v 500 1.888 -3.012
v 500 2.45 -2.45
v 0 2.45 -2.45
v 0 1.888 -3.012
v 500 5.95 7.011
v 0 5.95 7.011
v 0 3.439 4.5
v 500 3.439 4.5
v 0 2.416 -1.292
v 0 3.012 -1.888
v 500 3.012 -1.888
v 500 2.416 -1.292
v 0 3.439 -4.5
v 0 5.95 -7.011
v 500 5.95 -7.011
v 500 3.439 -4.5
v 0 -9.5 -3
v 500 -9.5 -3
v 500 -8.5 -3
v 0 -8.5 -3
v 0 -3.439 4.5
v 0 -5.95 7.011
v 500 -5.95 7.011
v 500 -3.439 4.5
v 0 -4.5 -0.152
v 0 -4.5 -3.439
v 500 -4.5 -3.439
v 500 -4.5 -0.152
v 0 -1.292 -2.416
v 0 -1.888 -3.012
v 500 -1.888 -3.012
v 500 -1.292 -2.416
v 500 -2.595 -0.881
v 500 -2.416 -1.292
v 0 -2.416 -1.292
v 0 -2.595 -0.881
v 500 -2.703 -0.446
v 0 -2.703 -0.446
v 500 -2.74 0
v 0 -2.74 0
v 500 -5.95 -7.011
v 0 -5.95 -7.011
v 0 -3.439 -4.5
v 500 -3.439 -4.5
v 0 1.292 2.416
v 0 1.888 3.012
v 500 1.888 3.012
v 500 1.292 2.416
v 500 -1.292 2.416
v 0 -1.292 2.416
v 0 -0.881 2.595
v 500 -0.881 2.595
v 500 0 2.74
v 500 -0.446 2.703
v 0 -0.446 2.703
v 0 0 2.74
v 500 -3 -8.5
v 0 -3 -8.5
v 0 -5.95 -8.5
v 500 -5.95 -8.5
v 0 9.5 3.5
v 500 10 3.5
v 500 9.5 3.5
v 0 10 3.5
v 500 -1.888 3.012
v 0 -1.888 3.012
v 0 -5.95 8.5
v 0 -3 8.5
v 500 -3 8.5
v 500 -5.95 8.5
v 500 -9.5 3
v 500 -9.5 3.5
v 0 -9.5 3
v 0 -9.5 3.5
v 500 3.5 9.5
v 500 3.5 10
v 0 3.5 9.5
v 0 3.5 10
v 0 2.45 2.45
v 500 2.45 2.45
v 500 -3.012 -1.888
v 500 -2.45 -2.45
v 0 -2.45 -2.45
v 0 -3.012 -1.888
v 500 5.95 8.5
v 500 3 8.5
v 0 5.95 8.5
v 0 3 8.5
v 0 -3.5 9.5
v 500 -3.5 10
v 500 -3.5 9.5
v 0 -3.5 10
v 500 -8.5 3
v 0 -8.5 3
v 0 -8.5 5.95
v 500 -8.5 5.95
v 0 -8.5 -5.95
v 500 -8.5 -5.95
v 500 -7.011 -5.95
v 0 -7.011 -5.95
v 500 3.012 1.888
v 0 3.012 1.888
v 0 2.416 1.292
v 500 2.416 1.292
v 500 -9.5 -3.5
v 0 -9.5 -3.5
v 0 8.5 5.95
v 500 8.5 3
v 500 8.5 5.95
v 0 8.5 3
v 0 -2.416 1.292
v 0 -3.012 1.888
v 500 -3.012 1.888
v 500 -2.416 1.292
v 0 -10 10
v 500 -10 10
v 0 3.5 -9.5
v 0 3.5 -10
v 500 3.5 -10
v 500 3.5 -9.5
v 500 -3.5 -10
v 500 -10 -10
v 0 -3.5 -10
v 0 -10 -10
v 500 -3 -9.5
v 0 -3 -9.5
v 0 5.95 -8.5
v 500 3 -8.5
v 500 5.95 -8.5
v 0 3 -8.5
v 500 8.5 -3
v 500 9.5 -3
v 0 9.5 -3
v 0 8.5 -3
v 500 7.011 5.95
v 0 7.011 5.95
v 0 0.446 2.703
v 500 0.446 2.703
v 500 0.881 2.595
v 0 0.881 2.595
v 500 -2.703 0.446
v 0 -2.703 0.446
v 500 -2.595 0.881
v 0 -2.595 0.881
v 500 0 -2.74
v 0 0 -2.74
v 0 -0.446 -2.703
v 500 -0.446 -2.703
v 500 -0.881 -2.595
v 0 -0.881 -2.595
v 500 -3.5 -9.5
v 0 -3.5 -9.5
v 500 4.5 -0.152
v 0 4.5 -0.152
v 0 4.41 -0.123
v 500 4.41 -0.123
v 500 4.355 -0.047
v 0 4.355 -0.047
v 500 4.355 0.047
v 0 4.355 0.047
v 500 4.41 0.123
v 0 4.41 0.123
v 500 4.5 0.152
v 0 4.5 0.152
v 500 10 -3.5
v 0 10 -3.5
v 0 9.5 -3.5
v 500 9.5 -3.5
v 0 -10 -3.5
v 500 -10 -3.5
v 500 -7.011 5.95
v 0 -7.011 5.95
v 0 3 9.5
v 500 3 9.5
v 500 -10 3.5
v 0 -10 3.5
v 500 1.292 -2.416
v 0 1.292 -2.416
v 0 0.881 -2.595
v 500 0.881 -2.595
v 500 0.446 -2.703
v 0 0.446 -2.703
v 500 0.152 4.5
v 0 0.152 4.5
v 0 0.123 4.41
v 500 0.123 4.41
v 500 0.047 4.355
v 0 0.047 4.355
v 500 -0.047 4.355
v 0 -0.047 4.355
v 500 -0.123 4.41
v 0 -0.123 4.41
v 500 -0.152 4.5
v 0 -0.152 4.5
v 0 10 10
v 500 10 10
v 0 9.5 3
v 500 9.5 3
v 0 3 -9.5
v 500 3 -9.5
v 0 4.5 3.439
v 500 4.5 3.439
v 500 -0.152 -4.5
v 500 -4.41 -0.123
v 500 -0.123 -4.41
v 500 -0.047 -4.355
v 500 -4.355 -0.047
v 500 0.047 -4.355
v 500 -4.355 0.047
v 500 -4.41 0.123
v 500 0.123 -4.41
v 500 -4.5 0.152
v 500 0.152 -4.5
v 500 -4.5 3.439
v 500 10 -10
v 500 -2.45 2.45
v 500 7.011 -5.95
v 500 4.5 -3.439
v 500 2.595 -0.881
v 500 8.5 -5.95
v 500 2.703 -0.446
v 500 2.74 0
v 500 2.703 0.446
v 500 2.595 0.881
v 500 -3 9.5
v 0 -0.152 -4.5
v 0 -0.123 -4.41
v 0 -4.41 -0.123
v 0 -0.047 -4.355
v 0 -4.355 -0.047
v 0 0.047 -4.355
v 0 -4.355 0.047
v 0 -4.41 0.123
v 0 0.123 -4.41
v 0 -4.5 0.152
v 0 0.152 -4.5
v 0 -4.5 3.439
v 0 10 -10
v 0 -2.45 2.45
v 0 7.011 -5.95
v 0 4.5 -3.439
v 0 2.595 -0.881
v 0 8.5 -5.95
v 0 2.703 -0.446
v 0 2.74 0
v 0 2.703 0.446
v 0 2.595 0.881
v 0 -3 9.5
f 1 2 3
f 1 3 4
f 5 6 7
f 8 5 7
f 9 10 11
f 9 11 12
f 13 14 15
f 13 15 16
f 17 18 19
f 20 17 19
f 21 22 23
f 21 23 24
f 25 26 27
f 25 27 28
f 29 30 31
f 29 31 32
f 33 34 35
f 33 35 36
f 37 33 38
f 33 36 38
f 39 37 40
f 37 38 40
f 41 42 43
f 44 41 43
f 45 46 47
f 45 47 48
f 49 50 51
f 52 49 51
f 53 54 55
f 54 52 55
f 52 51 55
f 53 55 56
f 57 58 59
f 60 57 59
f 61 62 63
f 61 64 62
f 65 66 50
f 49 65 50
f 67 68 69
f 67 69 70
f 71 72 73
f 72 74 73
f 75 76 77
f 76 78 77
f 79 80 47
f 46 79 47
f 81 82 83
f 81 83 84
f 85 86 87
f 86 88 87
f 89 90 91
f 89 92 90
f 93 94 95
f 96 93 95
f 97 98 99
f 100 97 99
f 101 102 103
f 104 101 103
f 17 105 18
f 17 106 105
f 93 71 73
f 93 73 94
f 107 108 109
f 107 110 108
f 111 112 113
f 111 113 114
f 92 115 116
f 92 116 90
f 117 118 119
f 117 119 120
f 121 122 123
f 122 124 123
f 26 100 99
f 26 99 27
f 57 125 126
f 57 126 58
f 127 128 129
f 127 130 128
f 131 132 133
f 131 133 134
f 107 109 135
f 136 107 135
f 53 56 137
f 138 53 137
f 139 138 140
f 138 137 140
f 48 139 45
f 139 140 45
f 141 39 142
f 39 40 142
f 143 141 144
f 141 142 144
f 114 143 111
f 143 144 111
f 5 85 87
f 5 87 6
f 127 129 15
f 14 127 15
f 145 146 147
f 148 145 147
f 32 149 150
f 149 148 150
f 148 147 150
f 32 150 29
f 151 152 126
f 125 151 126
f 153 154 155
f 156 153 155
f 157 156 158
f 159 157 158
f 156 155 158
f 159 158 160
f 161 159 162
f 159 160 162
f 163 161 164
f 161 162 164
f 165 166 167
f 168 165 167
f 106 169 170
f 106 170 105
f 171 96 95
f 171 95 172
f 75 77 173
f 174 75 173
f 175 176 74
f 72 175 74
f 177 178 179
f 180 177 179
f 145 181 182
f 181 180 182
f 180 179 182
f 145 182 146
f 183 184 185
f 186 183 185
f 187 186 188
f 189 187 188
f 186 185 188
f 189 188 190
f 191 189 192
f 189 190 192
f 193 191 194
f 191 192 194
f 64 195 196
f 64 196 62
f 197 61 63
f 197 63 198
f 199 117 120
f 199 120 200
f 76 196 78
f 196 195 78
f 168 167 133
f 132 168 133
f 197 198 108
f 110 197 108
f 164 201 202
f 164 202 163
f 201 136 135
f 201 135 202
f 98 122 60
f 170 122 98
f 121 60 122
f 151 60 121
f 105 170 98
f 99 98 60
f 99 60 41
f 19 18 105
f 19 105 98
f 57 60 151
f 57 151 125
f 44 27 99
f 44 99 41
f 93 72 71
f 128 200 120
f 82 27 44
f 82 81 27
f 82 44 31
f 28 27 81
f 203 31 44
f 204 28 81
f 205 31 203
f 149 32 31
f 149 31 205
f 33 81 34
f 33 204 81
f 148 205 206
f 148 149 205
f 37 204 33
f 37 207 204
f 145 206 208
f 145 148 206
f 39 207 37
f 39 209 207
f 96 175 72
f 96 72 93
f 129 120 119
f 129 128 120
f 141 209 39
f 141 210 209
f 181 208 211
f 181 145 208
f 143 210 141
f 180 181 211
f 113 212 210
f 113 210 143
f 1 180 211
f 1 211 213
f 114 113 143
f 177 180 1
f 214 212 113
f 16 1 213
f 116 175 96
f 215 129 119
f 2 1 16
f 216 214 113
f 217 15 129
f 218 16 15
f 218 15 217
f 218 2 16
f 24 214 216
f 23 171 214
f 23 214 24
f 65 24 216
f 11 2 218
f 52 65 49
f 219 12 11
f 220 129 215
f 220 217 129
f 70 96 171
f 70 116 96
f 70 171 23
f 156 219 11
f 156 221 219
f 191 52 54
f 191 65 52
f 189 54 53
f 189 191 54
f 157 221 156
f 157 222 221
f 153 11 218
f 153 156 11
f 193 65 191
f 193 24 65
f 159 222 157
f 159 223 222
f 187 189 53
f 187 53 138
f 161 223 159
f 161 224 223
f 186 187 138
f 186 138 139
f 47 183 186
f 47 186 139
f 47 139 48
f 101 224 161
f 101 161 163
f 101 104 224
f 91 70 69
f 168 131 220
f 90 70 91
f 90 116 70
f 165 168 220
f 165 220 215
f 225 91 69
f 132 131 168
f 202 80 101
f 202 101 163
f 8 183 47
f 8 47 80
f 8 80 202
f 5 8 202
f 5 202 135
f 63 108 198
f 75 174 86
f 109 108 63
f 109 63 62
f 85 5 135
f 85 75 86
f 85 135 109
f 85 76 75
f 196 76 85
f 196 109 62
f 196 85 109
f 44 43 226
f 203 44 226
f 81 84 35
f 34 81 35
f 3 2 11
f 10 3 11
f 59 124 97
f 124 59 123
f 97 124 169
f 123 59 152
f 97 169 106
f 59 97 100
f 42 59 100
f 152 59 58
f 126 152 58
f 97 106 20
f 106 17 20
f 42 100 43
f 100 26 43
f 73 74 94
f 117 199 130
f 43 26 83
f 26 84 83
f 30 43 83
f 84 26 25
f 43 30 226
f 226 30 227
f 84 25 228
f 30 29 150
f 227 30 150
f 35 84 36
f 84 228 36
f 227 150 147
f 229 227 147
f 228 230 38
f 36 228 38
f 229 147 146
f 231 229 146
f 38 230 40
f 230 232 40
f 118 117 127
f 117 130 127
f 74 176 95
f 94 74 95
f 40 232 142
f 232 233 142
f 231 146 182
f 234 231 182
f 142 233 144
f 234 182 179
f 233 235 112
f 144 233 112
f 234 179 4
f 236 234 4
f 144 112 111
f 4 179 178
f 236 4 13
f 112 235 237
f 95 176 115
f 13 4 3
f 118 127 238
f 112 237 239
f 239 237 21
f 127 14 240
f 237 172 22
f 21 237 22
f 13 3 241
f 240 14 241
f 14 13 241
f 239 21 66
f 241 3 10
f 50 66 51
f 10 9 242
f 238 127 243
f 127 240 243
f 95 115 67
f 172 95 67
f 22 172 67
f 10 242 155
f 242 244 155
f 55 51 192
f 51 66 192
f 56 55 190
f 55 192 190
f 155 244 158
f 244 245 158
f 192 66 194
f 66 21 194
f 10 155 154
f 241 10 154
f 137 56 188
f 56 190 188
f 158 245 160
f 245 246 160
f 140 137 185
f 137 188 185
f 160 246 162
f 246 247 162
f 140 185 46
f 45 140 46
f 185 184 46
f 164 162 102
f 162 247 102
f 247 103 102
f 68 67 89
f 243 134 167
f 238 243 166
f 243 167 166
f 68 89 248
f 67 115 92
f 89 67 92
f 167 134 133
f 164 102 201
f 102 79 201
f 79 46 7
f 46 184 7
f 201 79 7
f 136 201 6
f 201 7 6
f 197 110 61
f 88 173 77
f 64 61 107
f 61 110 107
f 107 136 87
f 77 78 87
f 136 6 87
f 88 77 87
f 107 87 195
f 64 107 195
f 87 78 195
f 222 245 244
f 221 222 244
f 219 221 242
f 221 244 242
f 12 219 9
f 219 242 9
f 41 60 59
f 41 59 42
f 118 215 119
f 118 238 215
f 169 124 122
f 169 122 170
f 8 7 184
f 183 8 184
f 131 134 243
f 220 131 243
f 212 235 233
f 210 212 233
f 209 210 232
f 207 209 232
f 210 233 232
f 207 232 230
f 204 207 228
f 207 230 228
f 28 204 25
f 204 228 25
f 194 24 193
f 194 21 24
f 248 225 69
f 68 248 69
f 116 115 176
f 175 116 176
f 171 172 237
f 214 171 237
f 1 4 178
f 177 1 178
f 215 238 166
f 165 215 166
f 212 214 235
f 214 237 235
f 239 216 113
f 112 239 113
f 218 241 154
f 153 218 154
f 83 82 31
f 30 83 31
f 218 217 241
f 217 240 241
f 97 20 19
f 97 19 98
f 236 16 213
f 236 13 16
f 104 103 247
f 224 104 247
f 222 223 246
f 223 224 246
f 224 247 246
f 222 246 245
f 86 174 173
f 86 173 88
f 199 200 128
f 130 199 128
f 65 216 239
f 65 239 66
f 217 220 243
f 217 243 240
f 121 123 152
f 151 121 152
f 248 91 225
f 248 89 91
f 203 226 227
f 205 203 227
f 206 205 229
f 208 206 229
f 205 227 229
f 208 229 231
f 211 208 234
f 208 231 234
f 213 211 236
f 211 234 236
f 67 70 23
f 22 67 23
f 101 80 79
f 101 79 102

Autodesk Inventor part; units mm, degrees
ref_plane "YZ Plane" through (0, 0, 0) normal (1, 0, 0) x (0, 1, 0)
ref_plane "XZ Plane" through (0, 0, 0) normal (0, 1, 0) x (-1, 0, 0)
ref_plane "XY Plane" through (0, 0, 0) normal (0, 0, 1) x (1, 0, 0)
sketch "Sketch1" plane through (0, 0, 0) normal (1, 0, 0) x (0, 1, 0)
  line L0 (-10, -10) -> (10, 10) construction
  line L1 (10, 10) -> (10, 3.5)
  line L2 (10, 3.5) -> (9.5, 3.5)
  line L3 (9.5, 3.5) -> (9.5, 3)
  line L4 (9.5, 3) -> (8.5, 3)
  line L5 (8.5, 3) -> (8.5, 5.95)
  line L6 (8.5, 5.95) -> (7.0107, 5.95)
  line L7 (7.0107, 5.95) -> (4.5, 3.4393)
  line L8 (4.5, 3.4393) -> (4.5, 0.1525)
  line L9 (2.4501, 2.4501) -> (3.0123, 1.888)
  line L10 (3.0123, 1.888) -> (2.4163, 1.292)
  arc A0 (2.74, 0) -> (2.4163, 1.292) centre (0, 0) ccw
  arc A1 (4.5, 0.1525) -> (4.3475, 0) centre (4.5, 0) ccw
  line L11 (10, 10) -> (2.4501, 2.4501)
  line L12 (4.3475, 0) -> (2.74, 0)
  line L13 (0, 0) -> (2.74, 0) construction
  line L14 (10, 10) -> (3.5, 10)
  line L15 (3.5, 10) -> (3.5, 9.5)
  line L16 (3.5, 9.5) -> (3, 9.5)
  line L17 (3, 9.5) -> (3, 8.5)
  line L18 (3, 8.5) -> (5.95, 8.5)
  line L19 (5.95, 8.5) -> (5.95, 7.0107)
  line L20 (5.95, 7.0107) -> (3.4393, 4.5)
  line L21 (3.4393, 4.5) -> (0.1525, 4.5)
  line L22 (2.4501, 2.4501) -> (1.888, 3.0123)
  line L23 (1.888, 3.0123) -> (1.292, 2.4163)
  arc A2 (1.292, 2.4163) -> (0, 2.74) centre (0, 0) ccw
  arc A3 (0, 4.3475) -> (0.1525, 4.5) centre (0, 4.5) ccw
  line L24 (0, 4.3475) -> (0, 2.74)
  line L25 (0, 0) -> (0, 2.74) construction
  line L26 (-8.5, 5.95) -> (-7.0107, 5.95)
  line L27 (-10, 3.5) -> (-9.5, 3.5)
  line L28 (-8.5, 3) -> (-8.5, 5.95)
  line L29 (-9.5, 3.5) -> (-9.5, 3)
  line L30 (-9.5, 3) -> (-8.5, 3)
  line L31 (-5.95, 8.5) -> (-5.95, 7.0107)
  line L32 (-7.0107, 5.95) -> (-4.5, 3.4393)
  line L33 (-5.95, 7.0107) -> (-3.4393, 4.5)
  line L34 (-10, 10) -> (-10, 3.5)
  line L35 (-10, 10) -> (-3.5, 10)
  line L36 (-10, 10) -> (-2.4501, 2.4501)
  line L37 (-3, 8.5) -> (-5.95, 8.5)
  line L38 (-3, 9.5) -> (-3, 8.5)
  line L39 (-3.5, 10) -> (-3.5, 9.5)
  line L40 (-3.5, 9.5) -> (-3, 9.5)
  line L41 (-3.4393, 4.5) -> (-0.1525, 4.5)
  line L42 (-2.4501, 2.4501) -> (-1.888, 3.0123)
  line L43 (-1.888, 3.0123) -> (-1.292, 2.4163)
  arc A4 (0, 2.74) -> (-1.292, 2.4163) centre (0, 0) ccw
  arc A5 (-0.1525, 4.5) -> (0, 4.3475) centre (0, 4.5) ccw
  line L44 (-2.4501, 2.4501) -> (-3.0123, 1.888)
  line L45 (-4.5, 3.4393) -> (-4.5, 0.1525)
  arc A6 (-4.3475, 0) -> (-4.5, 0.1525) centre (-4.5, 0) ccw
  line L46 (0, 4.3475) -> (0, 2.74)
  line L47 (-4.3475, 0) -> (-2.74, 0)
  arc A7 (-2.4163, 1.292) -> (-2.74, 0) centre (0, 0) ccw
  line L48 (0, 0) -> (0, 2.74) construction
  line L49 (-3.0123, 1.888) -> (-2.4163, 1.292)
  line L50 (-5.95, -8.5) -> (-5.95, -7.0107)
  line L51 (-3.5, -10) -> (-3.5, -9.5)
  line L52 (-3, -8.5) -> (-5.95, -8.5)
  line L53 (-3.5, -9.5) -> (-3, -9.5)
  line L54 (-3, -9.5) -> (-3, -8.5)
  line L55 (-8.5, -5.95) -> (-7.0107, -5.95)
  line L56 (-5.95, -7.0107) -> (-3.4393, -4.5)
  line L57 (-7.0107, -5.95) -> (-4.5, -3.4393)
  line L58 (-10, -10) -> (-3.5, -10)
  line L59 (-10, -10) -> (-10, -3.5)
  line L60 (-10, -10) -> (-2.4501, -2.4501)
  line L61 (-8.5, -3) -> (-8.5, -5.95)
  line L62 (-9.5, -3) -> (-8.5, -3)
  line L63 (-10, -3.5) -> (-9.5, -3.5)
  line L64 (-9.5, -3.5) -> (-9.5, -3)
  line L65 (-4.5, -3.4393) -> (-4.5, -0.1525)
  line L66 (-2.4501, -2.4501) -> (-3.0123, -1.888)
  line L67 (-3.0123, -1.888) -> (-2.4163, -1.292)
  arc A8 (-2.74, 0) -> (-2.4163, -1.292) centre (0, 0) ccw
  arc A9 (-4.5, -0.1525) -> (-4.3475, 0) centre (-4.5, 0) ccw
  line L68 (-2.4501, -2.4501) -> (-1.888, -3.0123)
  line L69 (-3.4393, -4.5) -> (-0.1525, -4.5)
  arc A10 (0, -4.3475) -> (-0.1525, -4.5) centre (0, -4.5) ccw
  line L70 (-4.3475, 0) -> (-2.74, 0)
  line L71 (0, -4.3475) -> (0, -2.74)
  arc A11 (-1.292, -2.4163) -> (0, -2.74) centre (0, 0) ccw
  line L72 (0, 0) -> (-2.74, 0) construction
  line L73 (-1.888, -3.0123) -> (-1.292, -2.4163)
  line L74 (8.5, -5.95) -> (7.0107, -5.95)
  line L75 (10, -3.5) -> (9.5, -3.5)
  line L76 (8.5, -3) -> (8.5, -5.95)
  line L77 (9.5, -3.5) -> (9.5, -3)
  line L78 (9.5, -3) -> (8.5, -3)
  line L79 (5.95, -8.5) -> (5.95, -7.0107)
  line L80 (7.0107, -5.95) -> (4.5, -3.4393)
  line L81 (5.95, -7.0107) -> (3.4393, -4.5)
  line L82 (10, -10) -> (10, -3.5)
  line L83 (10, -10) -> (3.5, -10)
  line L84 (10, -10) -> (2.4501, -2.4501)
  line L85 (3, -8.5) -> (5.95, -8.5)
  line L86 (3, -9.5) -> (3, -8.5)
  line L87 (3.5, -10) -> (3.5, -9.5)
  line L88 (3.5, -9.5) -> (3, -9.5)
  line L89 (3.4393, -4.5) -> (0.1525, -4.5)
  line L90 (2.4501, -2.4501) -> (1.888, -3.0123)
  line L91 (1.888, -3.0123) -> (1.292, -2.4163)
  arc A12 (0, -2.74) -> (1.292, -2.4163) centre (0, 0) ccw
  arc A13 (0.1525, -4.5) -> (0, -4.3475) centre (0, -4.5) ccw
  line L92 (2.4501, -2.4501) -> (3.0123, -1.888)
  line L93 (4.5, -3.4393) -> (4.5, -0.1525)
  arc A14 (4.3475, 0) -> (4.5, -0.1525) centre (4.5, 0) ccw
  line L94 (0, -4.3475) -> (0, -2.74)
  line L95 (4.3475, 0) -> (2.74, 0)
  arc A15 (2.4163, -1.292) -> (2.74, 0) centre (0, 0) ccw
  line L96 (0, 0) -> (0, -2.74) construction
  line L97 (3.0123, -1.888) -> (2.4163, -1.292)
  point P0 (9, 3)
  point P1 (3, 9)
  point P2 (-9, 3)
  point P3 (-3, 9)
  point P4 (-3, -9)
  point P5 (-9, -3)
  point P6 (9, -3)
  point P7 (3, -9)
  dimension "d2" = 6.5
  dimension "d3" = 0.5
  dimension "d4" = 4
  dimension "d5" = 3.465
  dimension "d6" = 5.48
  dimension "d7" = 0.795
  dimension "d8" = 0.305
  dimension "d9" = 2.95
  dimension "d11" = 0.75
  dimension "d14" = 45
  dimension "d15" = 10
  dimension "d16" = 1
  dimension "d17" = 3
  dimension "d18" = 45
  dimension "d21" = 360
extrude "Extrusion1" add sketch "Sketch1" along normal blind 500 contours L1 L2 L3 L4 L5 L6 L7 L8 A1 L12 A0 L10 L9 L11 | L11 L22 L23 A2 L24 A3 L21 L20 L19 L18 L17 L16 L15 L14 | L12 A14 L93 L80 L74 L76 L78 L77 L75 L82 L84 L92 L97 A15 | A4 L43 L42 L36 L35 L39 L40 L38 L37 L31 L33 L41 A5 L24 | L84 L83 L87 L88 L86 L85 L79 L81 L89 A13 L71 A12 L91 L90 | L44 L49 A7 L47 A6 L45 L32 L26 L28 L30 L29 L27 L34 L36 | L71 A10 L69 L56 L50 L52 L54 L53 L51 L58 L60 L68 L73 A11 | A8 L67 L66 L60 L59 L63 L64 L62 L61 L55 L57 L65 A9 L47
properties part number "20mm Extrusion 500mm" material "Aluminum 6061"
